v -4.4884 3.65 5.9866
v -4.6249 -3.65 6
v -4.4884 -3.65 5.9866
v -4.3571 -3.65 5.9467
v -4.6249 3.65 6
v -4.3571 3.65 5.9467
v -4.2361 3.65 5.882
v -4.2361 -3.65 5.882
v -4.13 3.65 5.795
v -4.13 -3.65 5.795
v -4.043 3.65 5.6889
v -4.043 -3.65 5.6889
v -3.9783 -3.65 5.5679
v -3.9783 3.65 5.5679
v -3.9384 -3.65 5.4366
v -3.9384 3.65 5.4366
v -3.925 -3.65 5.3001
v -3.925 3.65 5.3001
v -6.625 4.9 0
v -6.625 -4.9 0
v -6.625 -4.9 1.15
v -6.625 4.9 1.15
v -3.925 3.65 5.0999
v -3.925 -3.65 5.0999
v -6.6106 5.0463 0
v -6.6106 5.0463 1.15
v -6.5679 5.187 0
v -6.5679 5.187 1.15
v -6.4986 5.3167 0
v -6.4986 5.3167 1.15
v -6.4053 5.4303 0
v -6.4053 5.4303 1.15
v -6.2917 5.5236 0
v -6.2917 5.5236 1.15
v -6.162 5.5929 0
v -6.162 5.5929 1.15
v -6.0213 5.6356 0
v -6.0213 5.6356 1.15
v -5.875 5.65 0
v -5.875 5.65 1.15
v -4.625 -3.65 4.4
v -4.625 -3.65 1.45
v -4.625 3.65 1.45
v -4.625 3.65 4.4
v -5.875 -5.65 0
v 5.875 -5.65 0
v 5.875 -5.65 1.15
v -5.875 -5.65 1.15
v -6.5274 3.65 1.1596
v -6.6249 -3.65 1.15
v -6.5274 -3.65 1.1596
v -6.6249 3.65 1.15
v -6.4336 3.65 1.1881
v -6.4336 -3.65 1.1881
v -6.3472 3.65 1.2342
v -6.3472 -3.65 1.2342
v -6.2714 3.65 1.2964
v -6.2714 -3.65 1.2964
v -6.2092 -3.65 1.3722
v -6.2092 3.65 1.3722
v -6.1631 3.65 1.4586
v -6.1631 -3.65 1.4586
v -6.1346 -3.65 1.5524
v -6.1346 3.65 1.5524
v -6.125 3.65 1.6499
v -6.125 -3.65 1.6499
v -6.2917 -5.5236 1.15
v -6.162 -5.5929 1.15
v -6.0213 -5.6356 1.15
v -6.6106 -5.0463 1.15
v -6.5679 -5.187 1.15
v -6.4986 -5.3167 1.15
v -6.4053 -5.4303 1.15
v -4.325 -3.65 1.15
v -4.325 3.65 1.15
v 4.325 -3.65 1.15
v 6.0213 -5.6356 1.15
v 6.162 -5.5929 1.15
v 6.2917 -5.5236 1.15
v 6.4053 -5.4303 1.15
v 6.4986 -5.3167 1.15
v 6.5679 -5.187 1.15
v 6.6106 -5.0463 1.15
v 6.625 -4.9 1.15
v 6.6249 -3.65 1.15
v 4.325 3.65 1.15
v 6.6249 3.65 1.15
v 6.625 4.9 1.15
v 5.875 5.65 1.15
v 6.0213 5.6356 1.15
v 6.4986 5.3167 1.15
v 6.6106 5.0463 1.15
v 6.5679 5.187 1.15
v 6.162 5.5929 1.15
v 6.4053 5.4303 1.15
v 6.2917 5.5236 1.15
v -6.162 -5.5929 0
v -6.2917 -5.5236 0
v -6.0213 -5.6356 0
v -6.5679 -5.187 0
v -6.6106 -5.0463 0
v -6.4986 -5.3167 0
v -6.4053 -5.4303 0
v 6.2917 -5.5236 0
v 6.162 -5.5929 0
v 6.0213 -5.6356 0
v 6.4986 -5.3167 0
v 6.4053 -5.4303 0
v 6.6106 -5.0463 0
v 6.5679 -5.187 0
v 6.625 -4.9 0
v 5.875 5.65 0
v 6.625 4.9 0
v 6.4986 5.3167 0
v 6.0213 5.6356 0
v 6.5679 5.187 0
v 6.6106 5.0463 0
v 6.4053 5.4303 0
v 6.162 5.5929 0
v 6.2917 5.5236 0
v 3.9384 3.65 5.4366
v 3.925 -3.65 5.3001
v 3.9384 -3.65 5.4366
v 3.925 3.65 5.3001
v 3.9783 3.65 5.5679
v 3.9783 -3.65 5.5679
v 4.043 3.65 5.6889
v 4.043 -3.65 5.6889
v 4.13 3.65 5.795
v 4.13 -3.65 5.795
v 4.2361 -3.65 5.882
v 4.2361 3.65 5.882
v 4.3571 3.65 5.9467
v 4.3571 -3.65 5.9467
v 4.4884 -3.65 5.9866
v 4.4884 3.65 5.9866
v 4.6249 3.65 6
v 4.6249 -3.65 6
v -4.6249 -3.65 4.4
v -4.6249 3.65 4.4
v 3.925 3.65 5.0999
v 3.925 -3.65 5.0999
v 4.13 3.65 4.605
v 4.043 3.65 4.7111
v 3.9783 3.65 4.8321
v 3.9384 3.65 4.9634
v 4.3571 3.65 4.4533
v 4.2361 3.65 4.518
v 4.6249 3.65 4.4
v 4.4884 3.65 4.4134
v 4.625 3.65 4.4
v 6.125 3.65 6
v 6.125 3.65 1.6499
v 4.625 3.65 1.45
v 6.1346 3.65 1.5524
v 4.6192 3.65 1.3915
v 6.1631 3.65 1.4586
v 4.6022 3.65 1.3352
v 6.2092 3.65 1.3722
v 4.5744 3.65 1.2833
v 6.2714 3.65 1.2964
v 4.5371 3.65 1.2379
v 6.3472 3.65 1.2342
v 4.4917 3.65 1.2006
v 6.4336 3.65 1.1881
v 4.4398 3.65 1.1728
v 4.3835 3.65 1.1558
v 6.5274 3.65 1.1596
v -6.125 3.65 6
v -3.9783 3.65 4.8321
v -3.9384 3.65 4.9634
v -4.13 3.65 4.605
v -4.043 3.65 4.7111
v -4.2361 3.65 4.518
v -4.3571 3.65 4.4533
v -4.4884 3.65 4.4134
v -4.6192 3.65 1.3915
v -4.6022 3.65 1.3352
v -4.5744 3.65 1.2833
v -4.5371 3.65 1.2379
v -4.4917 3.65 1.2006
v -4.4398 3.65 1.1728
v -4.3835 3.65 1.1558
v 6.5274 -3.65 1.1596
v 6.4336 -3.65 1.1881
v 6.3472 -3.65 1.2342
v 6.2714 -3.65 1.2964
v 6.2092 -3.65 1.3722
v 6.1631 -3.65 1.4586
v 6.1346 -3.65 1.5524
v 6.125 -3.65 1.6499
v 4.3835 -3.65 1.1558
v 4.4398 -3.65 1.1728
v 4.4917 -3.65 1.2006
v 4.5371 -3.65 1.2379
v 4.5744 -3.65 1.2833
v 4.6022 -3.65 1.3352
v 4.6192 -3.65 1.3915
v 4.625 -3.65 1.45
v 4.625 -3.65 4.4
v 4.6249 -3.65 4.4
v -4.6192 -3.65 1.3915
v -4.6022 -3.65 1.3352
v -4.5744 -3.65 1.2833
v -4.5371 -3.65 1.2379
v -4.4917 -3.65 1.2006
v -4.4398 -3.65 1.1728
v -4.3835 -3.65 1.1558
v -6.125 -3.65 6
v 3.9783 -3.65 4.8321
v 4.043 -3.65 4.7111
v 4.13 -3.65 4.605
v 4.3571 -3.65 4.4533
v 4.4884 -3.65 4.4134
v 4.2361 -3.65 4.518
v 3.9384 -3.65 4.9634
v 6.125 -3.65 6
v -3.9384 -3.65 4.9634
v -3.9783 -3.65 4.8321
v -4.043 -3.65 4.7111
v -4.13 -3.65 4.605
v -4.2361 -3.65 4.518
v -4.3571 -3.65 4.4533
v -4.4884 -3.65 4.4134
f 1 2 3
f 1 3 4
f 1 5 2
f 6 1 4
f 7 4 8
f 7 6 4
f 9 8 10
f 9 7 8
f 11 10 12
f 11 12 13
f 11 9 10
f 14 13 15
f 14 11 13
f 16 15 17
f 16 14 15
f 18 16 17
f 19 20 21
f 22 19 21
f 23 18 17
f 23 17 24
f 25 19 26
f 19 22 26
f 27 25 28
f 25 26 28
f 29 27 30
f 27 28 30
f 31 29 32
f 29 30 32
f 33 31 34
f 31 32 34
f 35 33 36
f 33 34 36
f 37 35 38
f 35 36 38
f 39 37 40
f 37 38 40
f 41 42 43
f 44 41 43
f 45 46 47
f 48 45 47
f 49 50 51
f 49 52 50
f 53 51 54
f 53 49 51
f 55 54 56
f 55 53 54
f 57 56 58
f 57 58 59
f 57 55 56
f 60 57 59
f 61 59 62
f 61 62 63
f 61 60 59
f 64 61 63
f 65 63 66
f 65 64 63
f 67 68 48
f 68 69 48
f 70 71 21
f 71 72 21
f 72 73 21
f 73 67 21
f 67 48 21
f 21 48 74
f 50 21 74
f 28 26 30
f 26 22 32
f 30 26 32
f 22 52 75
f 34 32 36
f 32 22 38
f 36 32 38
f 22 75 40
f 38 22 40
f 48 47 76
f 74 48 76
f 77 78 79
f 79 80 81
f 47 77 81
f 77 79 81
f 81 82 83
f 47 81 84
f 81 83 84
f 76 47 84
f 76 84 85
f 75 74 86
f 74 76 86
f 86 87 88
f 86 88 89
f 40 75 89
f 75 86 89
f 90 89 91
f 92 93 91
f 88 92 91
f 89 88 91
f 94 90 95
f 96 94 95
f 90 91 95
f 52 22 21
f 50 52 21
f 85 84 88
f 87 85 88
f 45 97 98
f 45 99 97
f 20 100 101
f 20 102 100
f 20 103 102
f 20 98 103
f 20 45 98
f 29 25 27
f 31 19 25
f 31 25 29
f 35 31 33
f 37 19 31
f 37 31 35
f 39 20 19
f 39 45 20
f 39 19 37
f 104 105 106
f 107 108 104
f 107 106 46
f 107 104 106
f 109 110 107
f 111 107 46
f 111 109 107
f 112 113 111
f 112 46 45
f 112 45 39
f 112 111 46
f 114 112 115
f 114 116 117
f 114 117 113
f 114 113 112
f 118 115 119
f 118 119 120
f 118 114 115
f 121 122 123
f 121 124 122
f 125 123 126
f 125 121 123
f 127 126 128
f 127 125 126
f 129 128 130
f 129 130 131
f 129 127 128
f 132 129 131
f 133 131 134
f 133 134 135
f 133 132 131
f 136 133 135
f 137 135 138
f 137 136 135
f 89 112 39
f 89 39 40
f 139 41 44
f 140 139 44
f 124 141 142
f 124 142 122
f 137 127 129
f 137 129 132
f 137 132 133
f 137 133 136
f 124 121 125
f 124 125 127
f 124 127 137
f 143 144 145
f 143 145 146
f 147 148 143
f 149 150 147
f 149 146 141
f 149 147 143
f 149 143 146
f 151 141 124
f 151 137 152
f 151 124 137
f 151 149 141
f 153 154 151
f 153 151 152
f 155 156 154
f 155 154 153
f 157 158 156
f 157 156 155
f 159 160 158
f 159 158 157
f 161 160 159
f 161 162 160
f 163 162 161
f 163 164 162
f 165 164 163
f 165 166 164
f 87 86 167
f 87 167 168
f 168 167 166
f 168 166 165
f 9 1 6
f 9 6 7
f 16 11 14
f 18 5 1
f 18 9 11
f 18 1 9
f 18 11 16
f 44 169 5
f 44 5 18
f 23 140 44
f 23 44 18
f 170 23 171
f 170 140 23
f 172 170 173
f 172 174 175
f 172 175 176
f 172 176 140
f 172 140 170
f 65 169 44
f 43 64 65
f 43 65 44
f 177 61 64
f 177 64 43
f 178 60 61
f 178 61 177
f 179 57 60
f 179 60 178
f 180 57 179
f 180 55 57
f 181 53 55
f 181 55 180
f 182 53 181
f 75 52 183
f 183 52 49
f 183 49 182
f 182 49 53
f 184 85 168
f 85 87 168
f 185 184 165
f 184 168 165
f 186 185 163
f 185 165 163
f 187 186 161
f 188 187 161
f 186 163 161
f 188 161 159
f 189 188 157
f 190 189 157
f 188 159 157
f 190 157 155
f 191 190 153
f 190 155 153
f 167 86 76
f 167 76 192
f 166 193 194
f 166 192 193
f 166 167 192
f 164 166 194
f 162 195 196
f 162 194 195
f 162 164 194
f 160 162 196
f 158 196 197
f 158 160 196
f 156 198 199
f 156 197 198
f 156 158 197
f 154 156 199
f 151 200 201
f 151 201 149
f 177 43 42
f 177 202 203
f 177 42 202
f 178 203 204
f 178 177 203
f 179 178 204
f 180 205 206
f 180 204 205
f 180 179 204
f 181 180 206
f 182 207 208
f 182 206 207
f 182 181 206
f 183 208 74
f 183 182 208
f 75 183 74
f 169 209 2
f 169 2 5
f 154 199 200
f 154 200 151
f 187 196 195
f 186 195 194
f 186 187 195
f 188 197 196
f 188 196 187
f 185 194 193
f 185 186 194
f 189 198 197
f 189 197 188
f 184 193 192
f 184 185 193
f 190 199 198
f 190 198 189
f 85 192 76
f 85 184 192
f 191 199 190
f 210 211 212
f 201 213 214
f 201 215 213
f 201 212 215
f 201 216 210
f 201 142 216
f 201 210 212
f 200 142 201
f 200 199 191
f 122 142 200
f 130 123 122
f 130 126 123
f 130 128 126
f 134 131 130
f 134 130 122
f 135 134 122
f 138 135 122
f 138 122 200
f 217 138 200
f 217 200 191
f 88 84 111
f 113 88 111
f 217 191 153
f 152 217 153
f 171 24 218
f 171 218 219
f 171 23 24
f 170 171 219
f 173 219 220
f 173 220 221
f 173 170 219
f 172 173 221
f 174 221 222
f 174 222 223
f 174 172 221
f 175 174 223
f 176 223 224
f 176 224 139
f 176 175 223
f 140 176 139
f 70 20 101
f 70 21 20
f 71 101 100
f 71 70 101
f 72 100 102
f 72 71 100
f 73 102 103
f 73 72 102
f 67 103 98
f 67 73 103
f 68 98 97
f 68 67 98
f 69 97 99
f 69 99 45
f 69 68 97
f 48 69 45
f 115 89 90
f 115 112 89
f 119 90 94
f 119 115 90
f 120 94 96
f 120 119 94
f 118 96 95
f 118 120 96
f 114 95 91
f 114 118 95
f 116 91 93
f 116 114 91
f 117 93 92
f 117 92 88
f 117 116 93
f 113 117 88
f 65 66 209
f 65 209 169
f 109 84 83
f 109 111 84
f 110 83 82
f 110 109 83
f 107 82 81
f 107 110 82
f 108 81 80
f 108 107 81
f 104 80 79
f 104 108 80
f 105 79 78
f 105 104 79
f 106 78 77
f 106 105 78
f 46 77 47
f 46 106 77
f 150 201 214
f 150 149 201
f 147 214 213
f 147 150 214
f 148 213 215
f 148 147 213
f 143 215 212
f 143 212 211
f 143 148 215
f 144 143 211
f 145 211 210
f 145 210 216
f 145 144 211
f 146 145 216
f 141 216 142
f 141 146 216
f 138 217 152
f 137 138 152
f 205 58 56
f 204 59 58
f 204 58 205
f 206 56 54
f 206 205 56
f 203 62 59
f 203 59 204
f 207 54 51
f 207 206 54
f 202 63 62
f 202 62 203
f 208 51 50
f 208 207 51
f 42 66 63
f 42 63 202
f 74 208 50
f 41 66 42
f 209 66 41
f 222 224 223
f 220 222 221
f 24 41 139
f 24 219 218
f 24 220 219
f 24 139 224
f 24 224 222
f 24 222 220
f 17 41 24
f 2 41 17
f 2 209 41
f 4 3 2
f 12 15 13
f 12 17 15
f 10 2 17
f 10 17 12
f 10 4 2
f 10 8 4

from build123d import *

# Parameters (mm, degrees)
SKETCH_1_W          = 12.25
SKETCH_1_H          = 11.3
EXTRUDE_1_DEPTH     = 2.15
SKETCH_2_W          = 1.5
SKETCH_2_H          = 11.3
EXTRUDE_2_DEPTH     = 3.85
SKETCH_5_W          = 9.25
SKETCH_5_H          = 11.5
CUT_EXTRUDE_1_DEPTH = 1
SKETCH_8_W          = 1.6
SKETCH_8_H          = 11.3
EXTRUDE_5_DEPTH     = 0.7
SKETCH_9_W          = 1.6
SKETCH_9_H          = 11.3
EXTRUDE_6_DEPTH     = 0.7
FILLET_8_R          = 0.3
SKETCH_11_W         = 12.25
SKETCH_11_H         = 4.85
CUT_EXTRUDE_2_DEPTH = 2
SKETCH_12_W         = 12.25
SKETCH_12_H         = 4.85
CUT_EXTRUDE_3_DEPTH = 2
SKETCH_13_W         = 1.15
SKETCH_13_H         = 11.3
EXTRUDE_7_DEPTH     = 0.5
SKETCH_14_W         = 1.15
SKETCH_14_H         = 11.3
EXTRUDE_8_DEPTH     = 0.5
FILLET_9_R          = 0.5
FILLET_10_R         = 0.7
FILLET_11_R         = 0.75


with BuildPart() as part:
    # 스케치1 → 보스-돌출1 (new body)
    with BuildSketch(Plane.XY):
        Rectangle(SKETCH_1_W, SKETCH_1_H)
    extrude(amount=EXTRUDE_1_DEPTH)

    # 스케치2 → 보스-돌출2 (add)
    with BuildSketch(Plane.XY.offset(2.15)):
        with Locations((-5.375, 0)):
            Rectangle(SKETCH_2_W, SKETCH_2_H)
        with Locations((5.375, 0)):
            Rectangle(SKETCH_2_W, SKETCH_2_H)
    extrude(amount=EXTRUDE_2_DEPTH)

    # 스케치5 → 컷-돌출1 (cut)
    with BuildSketch(Plane.XY.offset(2.15)):
        Rectangle(SKETCH_5_W, SKETCH_5_H)
    extrude(amount=-CUT_EXTRUDE_1_DEPTH, mode=Mode.SUBTRACT)

    # 스케치8 → 보스-돌출5 (add)
    with BuildSketch(Plane(origin=(-4.625, 0, 0), x_dir=(0, 0, -1), z_dir=(1, 0, 0))):
        with Locations((-5.2, 0)):
            Rectangle(SKETCH_8_W, SKETCH_8_H)
    extrude(amount=EXTRUDE_5_DEPTH)

    # 스케치9 → 보스-돌출6 (add)
    with BuildSketch(Plane.ZY.offset(-4.625)):
        with Locations((5.2, 0)):
            Rectangle(SKETCH_9_W, SKETCH_9_H)
    extrude(amount=EXTRUDE_6_DEPTH)

    # 필렛8
    fillet_8_edges = [part.edges().sort_by_distance(p)[0] for p in [
        (4.625, 0, 1.15),
        (-4.625, 0, 1.15),
    ]]
    fillet(fillet_8_edges, radius=FILLET_8_R)

    # 스케치11 → 컷-돌출2 (cut)
    with BuildSketch(Plane(origin=(0, 5.65, 0), x_dir=(1, 0, 0), z_dir=(0, 1, 0))):
        with Locations((0, -3.575)):
            Rectangle(SKETCH_11_W, SKETCH_11_H)
    extrude(amount=-CUT_EXTRUDE_2_DEPTH, mode=Mode.SUBTRACT)

    # 스케치12 → 컷-돌출3 (cut)
    with BuildSketch(Plane.XZ.offset(5.65)):
        with Locations((0, 3.575)):
            Rectangle(SKETCH_12_W, SKETCH_12_H)
    extrude(amount=-CUT_EXTRUDE_3_DEPTH, mode=Mode.SUBTRACT)

    # 스케치13 → 보스-돌출7 (add)
    with BuildSketch(Plane(origin=(6.125, 0, 0), x_dir=(0, 0, -1), z_dir=(1, 0, 0))):
        with Locations((-0.575, 0)):
            Rectangle(SKETCH_13_W, SKETCH_13_H)
    extrude(amount=EXTRUDE_7_DEPTH)

    # 스케치14 → 보스-돌출8 (add)
    with BuildSketch(Plane.ZY.offset(6.125)):
        with Locations((0.575, 0)):
            Rectangle(SKETCH_14_W, SKETCH_14_H)
    extrude(amount=EXTRUDE_8_DEPTH)

    # 필렛9
    fillet_9_edges = [part.edges().sort_by_distance(p)[0] for p in [
        (6.125, 0, 1.15),
        (-6.125, 0, 1.15),
    ]]
    fillet(fillet_9_edges, radius=FILLET_9_R - 0.0001)  # a hair under: the kernel refuses the full size

    # 필렛10
    fillet_10_edges = [part.edges().sort_by_distance(p)[0] for p in [
        (-3.925, 0, 6),
        (-3.925, 0, 4.4),
        (3.925, 0, 4.4),
        (3.925, 0, 6),
    ]]
    fillet(fillet_10_edges, radius=FILLET_10_R - 0.0001)  # a hair under: the kernel refuses the full size

    # 필렛11
    fillet_11_edges = [part.edges().sort_by_distance(p)[0] for p in [
        (6.625, -5.65, 0.575),
        (6.625, 5.65, 0.575),
        (-6.625, 5.65, 0.575),
        (-6.625, -5.65, 0.575),
    ]]
    fillet(fillet_11_edges, radius=FILLET_11_R)


solid = part.part
